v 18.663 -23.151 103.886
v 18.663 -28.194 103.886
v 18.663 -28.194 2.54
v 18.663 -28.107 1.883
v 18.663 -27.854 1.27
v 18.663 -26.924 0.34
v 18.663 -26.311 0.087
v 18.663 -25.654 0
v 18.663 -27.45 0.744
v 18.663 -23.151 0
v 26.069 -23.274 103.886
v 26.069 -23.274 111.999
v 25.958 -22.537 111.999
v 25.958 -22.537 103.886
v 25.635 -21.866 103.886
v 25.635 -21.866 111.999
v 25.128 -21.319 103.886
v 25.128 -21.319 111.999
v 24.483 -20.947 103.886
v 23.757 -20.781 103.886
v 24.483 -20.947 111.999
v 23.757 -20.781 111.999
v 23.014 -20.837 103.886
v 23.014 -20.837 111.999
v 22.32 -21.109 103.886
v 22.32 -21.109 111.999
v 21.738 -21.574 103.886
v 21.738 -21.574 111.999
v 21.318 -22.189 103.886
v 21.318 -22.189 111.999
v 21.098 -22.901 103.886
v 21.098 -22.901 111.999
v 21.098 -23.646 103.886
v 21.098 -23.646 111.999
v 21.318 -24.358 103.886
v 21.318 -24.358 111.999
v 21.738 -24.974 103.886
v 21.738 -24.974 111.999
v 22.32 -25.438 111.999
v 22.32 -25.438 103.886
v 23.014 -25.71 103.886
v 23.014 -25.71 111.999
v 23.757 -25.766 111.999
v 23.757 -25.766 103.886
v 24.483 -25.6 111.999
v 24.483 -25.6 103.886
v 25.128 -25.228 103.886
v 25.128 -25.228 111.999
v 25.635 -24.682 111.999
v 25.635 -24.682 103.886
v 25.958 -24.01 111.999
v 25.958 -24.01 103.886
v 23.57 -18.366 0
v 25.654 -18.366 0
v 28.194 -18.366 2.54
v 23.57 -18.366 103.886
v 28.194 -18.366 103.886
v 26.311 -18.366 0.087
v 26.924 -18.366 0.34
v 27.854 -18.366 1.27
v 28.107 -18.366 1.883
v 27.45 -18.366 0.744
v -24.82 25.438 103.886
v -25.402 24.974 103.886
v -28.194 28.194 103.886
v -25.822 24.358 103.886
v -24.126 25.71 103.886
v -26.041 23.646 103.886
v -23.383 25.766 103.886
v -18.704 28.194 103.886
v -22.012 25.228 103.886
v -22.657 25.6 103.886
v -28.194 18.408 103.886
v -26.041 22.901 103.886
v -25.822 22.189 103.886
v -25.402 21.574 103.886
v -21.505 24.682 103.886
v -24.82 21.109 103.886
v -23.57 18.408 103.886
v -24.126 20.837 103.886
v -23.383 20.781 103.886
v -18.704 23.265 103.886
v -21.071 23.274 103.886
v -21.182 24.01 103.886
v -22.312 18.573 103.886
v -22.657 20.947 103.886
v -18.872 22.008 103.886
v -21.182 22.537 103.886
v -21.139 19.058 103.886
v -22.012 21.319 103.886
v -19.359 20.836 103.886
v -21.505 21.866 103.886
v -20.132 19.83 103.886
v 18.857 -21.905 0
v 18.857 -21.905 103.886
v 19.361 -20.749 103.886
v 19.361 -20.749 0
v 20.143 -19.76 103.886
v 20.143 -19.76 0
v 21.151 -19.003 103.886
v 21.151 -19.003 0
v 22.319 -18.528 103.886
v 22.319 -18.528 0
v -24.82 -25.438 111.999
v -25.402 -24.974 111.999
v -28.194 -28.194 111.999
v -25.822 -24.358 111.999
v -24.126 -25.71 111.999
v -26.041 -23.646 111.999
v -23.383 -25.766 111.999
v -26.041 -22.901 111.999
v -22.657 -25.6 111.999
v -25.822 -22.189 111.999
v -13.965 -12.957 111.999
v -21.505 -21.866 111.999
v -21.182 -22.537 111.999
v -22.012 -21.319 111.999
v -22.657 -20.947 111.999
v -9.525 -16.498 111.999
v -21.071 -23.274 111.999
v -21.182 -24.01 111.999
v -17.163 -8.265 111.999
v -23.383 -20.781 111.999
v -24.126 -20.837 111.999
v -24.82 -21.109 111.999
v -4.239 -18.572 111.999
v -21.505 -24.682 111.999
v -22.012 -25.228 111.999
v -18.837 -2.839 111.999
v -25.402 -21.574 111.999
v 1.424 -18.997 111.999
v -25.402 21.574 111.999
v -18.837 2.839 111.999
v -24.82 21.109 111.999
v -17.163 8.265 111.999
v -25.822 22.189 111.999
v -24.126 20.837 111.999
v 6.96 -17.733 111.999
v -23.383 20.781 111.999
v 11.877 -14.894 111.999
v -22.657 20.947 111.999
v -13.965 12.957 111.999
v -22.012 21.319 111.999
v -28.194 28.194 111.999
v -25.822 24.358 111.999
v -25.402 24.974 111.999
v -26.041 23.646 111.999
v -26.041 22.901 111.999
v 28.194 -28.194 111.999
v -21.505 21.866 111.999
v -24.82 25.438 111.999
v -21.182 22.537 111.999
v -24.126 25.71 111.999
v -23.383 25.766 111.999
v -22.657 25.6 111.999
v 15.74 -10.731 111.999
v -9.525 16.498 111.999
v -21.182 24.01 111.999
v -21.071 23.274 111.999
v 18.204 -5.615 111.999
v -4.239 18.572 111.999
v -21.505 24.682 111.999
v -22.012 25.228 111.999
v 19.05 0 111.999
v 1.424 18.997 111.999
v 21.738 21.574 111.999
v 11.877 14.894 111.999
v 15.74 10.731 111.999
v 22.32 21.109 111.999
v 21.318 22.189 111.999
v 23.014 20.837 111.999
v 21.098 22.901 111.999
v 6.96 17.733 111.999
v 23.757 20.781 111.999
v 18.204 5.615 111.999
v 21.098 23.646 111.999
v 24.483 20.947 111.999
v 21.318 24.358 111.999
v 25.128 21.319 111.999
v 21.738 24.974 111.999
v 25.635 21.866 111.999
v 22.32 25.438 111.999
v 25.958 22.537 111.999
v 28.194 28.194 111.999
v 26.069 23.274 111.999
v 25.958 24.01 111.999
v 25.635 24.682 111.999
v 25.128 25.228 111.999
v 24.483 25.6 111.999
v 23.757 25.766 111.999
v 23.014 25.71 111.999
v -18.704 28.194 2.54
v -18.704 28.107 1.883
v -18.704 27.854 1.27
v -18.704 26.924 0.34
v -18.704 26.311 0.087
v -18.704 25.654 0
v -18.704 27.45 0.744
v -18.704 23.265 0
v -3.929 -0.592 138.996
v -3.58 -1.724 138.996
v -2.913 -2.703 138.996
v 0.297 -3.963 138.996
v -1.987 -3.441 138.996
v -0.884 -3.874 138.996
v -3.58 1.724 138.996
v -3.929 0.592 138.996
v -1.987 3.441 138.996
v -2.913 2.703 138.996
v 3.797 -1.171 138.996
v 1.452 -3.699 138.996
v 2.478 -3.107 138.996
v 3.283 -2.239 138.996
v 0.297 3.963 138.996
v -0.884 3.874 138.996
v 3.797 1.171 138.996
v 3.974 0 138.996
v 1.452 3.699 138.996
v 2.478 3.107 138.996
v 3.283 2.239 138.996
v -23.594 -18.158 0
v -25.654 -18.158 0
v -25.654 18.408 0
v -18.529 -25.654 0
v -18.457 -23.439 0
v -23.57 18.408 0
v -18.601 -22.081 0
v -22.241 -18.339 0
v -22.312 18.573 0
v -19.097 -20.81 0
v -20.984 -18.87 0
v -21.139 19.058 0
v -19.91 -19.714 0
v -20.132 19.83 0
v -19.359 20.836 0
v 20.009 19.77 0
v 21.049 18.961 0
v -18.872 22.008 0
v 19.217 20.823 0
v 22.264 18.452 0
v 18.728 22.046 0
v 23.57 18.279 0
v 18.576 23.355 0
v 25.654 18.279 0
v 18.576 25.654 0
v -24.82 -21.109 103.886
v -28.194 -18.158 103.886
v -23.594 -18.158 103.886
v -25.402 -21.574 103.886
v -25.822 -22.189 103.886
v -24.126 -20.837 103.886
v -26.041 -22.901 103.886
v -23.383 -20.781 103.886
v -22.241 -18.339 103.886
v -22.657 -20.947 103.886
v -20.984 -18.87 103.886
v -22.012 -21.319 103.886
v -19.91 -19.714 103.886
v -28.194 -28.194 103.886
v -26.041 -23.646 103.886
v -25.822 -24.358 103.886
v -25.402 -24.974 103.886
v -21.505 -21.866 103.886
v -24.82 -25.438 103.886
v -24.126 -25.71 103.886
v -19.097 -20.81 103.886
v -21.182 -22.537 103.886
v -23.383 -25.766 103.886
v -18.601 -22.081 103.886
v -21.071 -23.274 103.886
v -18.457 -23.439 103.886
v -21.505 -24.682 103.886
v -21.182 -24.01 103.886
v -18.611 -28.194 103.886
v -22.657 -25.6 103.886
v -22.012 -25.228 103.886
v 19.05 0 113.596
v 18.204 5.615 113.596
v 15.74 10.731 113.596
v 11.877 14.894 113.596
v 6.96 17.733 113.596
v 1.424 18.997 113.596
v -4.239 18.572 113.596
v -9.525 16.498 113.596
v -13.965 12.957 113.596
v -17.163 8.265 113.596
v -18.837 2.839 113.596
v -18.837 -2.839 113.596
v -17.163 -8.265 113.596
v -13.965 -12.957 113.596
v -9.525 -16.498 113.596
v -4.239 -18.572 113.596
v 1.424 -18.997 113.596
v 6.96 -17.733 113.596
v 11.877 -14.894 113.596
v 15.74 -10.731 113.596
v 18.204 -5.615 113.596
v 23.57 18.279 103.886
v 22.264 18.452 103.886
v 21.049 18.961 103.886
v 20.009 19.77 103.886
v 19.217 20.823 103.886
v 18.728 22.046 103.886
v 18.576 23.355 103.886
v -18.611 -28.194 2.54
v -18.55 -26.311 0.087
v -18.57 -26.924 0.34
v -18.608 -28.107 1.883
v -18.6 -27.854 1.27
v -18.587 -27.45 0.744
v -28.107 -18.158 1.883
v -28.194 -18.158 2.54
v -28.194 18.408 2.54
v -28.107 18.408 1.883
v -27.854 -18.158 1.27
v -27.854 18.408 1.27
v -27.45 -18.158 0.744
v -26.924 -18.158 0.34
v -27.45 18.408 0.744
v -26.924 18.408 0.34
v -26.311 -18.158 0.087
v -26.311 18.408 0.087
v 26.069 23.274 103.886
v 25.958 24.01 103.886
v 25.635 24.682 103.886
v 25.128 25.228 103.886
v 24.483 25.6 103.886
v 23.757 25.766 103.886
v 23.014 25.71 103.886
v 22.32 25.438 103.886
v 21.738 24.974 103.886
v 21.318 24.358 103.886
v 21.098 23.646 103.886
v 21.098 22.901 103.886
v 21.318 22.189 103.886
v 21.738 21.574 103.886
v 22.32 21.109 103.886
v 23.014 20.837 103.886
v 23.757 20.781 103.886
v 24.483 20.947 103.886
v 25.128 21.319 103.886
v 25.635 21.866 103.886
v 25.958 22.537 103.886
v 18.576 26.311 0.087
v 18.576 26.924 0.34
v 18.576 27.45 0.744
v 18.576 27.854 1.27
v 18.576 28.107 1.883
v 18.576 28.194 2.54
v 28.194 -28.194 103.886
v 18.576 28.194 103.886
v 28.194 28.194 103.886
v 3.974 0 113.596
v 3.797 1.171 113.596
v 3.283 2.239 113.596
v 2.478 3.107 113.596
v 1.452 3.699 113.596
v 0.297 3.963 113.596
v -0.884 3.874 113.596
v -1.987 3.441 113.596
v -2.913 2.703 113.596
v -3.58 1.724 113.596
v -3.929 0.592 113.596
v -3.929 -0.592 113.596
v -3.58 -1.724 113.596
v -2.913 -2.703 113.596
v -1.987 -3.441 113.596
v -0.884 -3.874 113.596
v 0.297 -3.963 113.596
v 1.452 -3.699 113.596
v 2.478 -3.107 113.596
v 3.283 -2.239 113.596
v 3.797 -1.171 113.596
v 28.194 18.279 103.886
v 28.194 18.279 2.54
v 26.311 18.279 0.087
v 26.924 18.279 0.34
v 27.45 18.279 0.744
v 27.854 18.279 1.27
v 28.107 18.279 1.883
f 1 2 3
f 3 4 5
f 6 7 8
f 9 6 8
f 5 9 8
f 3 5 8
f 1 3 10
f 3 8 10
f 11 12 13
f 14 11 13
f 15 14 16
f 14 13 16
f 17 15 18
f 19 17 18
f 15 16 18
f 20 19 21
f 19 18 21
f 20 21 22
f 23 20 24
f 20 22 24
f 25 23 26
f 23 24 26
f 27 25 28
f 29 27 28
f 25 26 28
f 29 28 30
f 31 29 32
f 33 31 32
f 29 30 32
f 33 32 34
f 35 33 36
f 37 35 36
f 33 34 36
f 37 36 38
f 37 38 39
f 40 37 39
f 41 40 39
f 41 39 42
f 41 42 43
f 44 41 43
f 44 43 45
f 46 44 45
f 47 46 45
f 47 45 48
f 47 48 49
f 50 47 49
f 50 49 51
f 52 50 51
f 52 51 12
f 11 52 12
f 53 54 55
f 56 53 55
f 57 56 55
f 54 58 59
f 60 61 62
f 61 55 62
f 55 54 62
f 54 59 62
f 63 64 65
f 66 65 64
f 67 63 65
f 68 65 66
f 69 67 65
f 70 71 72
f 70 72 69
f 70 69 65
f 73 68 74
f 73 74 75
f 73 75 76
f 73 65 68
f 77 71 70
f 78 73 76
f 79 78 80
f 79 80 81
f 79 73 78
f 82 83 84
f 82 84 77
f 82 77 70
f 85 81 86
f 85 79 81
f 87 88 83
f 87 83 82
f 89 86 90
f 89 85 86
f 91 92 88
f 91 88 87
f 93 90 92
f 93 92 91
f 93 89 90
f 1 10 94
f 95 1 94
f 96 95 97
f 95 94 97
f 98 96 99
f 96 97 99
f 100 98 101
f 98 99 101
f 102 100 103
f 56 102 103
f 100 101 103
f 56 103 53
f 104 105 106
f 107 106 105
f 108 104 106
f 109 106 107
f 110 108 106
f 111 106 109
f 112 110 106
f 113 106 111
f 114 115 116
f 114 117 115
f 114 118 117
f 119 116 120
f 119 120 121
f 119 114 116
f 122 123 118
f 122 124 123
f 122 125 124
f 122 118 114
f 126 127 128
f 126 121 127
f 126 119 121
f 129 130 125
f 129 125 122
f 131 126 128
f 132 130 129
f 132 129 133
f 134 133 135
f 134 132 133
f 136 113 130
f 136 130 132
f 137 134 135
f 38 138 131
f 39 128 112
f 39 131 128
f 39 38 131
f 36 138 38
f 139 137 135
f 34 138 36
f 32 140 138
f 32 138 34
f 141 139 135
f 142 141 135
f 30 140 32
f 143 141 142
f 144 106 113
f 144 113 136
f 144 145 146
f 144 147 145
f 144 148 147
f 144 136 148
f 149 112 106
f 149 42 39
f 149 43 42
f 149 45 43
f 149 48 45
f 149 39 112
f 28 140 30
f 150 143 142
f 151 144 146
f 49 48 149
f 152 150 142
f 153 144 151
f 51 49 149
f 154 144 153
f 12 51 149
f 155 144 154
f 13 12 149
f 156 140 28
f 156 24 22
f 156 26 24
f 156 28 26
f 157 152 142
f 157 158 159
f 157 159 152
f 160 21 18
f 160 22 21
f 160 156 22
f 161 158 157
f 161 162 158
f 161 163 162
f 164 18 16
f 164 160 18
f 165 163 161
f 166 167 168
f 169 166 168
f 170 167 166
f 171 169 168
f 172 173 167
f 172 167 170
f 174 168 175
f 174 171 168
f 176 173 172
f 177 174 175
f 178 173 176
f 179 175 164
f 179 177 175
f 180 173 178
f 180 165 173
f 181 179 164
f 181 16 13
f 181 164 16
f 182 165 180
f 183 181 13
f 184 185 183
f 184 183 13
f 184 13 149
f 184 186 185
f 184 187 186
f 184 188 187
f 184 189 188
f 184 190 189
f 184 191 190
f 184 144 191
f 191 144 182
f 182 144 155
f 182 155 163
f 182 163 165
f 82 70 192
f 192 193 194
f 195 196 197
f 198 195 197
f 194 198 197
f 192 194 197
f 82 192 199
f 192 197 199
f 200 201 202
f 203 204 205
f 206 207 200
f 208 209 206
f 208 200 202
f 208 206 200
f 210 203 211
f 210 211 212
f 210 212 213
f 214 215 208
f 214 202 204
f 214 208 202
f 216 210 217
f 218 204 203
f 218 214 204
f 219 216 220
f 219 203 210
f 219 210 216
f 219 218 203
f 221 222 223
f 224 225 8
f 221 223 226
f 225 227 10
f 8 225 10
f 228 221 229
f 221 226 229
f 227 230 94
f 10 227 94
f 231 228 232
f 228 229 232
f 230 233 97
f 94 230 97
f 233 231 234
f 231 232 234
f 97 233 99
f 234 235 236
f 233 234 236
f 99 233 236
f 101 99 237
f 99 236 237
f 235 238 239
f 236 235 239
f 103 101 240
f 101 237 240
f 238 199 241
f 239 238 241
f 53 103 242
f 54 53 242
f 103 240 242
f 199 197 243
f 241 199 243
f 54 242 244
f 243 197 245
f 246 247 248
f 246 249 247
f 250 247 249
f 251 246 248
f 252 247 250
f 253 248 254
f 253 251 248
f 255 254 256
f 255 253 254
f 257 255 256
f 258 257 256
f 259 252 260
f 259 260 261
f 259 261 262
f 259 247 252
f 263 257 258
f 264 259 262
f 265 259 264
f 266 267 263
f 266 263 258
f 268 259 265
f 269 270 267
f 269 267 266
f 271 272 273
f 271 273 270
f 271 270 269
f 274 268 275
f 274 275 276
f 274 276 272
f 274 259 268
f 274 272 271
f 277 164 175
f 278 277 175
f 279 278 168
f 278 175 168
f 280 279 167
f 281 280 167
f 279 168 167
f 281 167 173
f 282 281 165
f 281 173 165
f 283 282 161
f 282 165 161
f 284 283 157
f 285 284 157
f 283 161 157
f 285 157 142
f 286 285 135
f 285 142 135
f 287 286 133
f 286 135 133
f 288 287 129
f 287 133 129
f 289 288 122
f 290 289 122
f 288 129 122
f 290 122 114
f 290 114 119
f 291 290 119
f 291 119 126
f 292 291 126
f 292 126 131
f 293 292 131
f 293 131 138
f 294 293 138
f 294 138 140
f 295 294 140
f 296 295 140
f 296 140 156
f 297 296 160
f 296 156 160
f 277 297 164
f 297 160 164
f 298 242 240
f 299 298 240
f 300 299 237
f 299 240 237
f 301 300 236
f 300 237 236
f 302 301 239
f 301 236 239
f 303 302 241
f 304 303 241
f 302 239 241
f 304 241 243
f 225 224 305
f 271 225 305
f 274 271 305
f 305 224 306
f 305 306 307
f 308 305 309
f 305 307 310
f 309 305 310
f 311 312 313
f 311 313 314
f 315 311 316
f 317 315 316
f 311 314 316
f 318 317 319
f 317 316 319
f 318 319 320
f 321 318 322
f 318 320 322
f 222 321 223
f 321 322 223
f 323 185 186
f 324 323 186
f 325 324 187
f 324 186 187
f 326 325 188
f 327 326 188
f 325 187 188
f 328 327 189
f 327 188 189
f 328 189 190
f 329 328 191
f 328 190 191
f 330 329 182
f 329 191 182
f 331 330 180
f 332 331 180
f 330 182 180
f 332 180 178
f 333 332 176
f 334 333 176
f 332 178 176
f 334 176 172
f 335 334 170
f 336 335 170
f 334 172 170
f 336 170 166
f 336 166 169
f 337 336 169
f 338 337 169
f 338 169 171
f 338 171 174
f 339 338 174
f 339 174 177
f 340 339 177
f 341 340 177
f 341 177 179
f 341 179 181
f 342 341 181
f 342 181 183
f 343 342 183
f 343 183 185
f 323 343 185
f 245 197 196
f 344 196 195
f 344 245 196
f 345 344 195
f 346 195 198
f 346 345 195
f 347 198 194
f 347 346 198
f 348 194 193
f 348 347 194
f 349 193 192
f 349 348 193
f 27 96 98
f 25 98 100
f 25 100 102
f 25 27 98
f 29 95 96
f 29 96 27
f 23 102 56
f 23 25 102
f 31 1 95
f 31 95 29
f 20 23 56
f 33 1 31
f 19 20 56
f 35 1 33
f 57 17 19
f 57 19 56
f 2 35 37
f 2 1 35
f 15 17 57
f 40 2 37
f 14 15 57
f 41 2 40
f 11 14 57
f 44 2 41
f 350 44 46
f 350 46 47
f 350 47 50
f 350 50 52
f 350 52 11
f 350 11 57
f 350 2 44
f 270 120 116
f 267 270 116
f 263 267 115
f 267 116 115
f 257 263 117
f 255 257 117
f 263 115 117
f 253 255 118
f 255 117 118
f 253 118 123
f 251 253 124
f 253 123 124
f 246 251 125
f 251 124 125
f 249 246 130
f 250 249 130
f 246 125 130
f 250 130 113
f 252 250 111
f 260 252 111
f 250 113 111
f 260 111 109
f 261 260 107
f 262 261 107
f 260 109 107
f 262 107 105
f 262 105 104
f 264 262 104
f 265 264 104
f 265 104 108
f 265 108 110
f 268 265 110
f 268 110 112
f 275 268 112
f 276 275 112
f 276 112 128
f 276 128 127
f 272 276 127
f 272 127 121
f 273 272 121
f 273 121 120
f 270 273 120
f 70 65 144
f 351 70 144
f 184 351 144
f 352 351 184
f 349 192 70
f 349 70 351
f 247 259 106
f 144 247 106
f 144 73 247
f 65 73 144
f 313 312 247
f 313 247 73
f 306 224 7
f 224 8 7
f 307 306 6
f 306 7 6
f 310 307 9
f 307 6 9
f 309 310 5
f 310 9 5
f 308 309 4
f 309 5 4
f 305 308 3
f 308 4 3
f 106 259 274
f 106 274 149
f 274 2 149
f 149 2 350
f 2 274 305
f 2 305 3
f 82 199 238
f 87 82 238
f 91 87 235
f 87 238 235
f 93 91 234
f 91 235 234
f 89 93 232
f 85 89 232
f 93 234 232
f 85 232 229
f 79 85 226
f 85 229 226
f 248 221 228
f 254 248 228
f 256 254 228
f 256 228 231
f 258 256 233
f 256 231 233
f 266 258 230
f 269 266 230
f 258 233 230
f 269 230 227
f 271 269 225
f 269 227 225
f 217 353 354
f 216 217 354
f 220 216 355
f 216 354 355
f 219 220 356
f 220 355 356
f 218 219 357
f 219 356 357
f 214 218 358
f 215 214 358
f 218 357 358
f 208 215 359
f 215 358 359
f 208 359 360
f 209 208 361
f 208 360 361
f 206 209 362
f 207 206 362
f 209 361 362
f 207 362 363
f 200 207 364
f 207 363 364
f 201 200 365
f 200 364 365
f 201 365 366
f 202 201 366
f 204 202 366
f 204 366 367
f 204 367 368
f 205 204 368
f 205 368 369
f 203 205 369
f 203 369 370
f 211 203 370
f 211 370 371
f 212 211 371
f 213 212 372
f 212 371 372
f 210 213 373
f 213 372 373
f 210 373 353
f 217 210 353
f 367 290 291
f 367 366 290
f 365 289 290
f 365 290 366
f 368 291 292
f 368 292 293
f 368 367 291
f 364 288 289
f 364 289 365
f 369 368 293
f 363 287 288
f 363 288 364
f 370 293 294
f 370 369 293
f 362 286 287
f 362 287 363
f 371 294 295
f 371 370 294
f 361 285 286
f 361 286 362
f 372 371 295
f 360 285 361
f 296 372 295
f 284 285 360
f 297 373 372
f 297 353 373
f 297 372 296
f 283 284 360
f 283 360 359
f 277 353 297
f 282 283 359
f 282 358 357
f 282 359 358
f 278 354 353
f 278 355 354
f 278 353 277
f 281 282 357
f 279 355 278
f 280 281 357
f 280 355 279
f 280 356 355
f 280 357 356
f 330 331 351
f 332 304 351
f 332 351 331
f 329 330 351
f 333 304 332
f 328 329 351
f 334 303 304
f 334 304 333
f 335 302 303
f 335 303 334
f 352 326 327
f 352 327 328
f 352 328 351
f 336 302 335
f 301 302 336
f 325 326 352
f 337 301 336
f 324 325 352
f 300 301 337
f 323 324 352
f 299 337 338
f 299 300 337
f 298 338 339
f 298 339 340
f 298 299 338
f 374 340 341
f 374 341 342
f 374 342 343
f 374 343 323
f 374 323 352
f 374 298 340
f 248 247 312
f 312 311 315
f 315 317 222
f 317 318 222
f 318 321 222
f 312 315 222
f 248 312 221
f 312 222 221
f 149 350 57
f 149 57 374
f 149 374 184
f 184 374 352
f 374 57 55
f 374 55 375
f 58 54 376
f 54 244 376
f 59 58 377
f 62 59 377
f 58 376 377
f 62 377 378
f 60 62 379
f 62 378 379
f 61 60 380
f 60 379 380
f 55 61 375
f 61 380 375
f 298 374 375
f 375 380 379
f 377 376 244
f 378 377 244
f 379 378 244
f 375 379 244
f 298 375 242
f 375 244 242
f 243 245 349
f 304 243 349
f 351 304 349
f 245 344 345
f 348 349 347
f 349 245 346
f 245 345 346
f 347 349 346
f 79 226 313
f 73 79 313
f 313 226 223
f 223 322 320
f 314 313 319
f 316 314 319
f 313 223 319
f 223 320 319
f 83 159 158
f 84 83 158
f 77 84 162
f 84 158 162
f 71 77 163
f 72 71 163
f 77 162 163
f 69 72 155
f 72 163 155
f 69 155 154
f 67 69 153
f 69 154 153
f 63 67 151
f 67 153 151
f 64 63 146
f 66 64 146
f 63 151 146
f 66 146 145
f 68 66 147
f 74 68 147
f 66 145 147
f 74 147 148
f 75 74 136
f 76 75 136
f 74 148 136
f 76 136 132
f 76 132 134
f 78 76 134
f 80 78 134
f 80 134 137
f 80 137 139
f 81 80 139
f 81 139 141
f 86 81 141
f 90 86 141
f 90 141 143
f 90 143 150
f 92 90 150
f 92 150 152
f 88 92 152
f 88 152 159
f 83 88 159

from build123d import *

# Parameters (mm, degrees)
F0_W     = 56.388
F0_H     = 56.388
F1_DEPTH = 111.99876
F2_R     = 2.49936
F3_DEPTH = 111.99976
F4_R     = 19.05
F5_DEPTH = 1.59766
F6_R     = 3.97383
F7_DEPTH = 25.4
F9_DEPTH = 103.886
F10_R    = 2.54


with BuildPart() as f1:
    # F0 (on Top) → F1 (new body)
    with BuildSketch(Plane.XY):
        Rectangle(F0_W, F0_H)
    extrude(amount=F1_DEPTH)

    # F2 (on face) → F3 (cut, through all)
    with BuildSketch(Plane.XY.offset(111.99876)):
        with Locations((-23.56993, 23.273565)):
            Circle(F2_R)
        with Locations((23.56993, 23.273565)):
            Circle(F2_R)
        with Locations((23.56993, -23.273565)):
            Circle(F2_R)
        with Locations((-23.56993, -23.273565)):
            Circle(F2_R)
    extrude(amount=-F3_DEPTH, mode=Mode.SUBTRACT)

    # F4 (on face) → F5 (join)
    with BuildSketch(Plane.XY.offset(111.99876)):
        Circle(F4_R)
    extrude(amount=F5_DEPTH)

    # F6 (on face) → F7 (join)
    with BuildSketch(Plane.XY.offset(113.59642)):
        Circle(F6_R)
    extrude(amount=F7_DEPTH)

    # F8 (on face) → F9 (cut)
    with BuildSketch(Plane(origin=(0, 0, 0), x_dir=(1, 0, 0), z_dir=(0, 0, -1))):
        with BuildLine():
            ThreePointArc((-23.594014, 18.158077), (-19.910458, 19.713716), (-18.457055, 23.438796))
            Line((-18.457055, 23.438796), (-18.610727, 28.194))
            Line((-18.610727, 28.194), (-28.194, 28.194))
            Line((-28.194, 28.194), (-28.194, 18.158077))
            Line((-28.194, 18.158077), (-23.594014, 18.158077))
        make_face()
        with BuildLine():
            Line((-18.704263, -28.194), (-18.704263, -23.265395))
            ThreePointArc((-18.704263, -23.265395), (-20.132269, -19.830127), (-23.56993, -18.407891))
            Line((-23.56993, -18.407891), (-28.194, -18.407891))
            Line((-28.194, -18.407891), (-28.194, -28.194))
            Line((-28.194, -28.194), (-18.704263, -28.194))
        make_face()
        with BuildLine():
            ThreePointArc((23.56993, -18.27852), (20.009329, -19.770338), (18.575544, -23.3547))
            Line((18.575544, -23.3547), (18.575544, -28.194))
            Line((18.575544, -28.194), (28.194, -28.194))
            Line((28.194, -28.194), (28.194, -18.27852))
            Line((28.194, -18.27852), (23.56993, -18.27852))
        make_face()
        with BuildLine():
            Line((18.663428, 28.194), (18.663428, 23.151265))
            ThreePointArc((18.663428, 23.151265), (20.142944, 19.760093), (23.56993, 18.365539))
            Line((23.56993, 18.365539), (28.194, 18.365539))
            Line((28.194, 18.365539), (28.194, 28.194))
            Line((28.194, 28.194), (18.663428, 28.194))
        make_face()
    extrude(amount=-F9_DEPTH, mode=Mode.SUBTRACT)

    # F10
    f10_edges = [f1.edges().sort_by_distance(p)[0] for p in [
        (-28.194, 0.124907, 0),
        (0.026351, -28.194, 0),
        (28.194, -0.04351, 0),
        (-0.06436, 28.194, 0),
    ]]
    fillet(f10_edges, radius=F10_R)


solid = f1.part
